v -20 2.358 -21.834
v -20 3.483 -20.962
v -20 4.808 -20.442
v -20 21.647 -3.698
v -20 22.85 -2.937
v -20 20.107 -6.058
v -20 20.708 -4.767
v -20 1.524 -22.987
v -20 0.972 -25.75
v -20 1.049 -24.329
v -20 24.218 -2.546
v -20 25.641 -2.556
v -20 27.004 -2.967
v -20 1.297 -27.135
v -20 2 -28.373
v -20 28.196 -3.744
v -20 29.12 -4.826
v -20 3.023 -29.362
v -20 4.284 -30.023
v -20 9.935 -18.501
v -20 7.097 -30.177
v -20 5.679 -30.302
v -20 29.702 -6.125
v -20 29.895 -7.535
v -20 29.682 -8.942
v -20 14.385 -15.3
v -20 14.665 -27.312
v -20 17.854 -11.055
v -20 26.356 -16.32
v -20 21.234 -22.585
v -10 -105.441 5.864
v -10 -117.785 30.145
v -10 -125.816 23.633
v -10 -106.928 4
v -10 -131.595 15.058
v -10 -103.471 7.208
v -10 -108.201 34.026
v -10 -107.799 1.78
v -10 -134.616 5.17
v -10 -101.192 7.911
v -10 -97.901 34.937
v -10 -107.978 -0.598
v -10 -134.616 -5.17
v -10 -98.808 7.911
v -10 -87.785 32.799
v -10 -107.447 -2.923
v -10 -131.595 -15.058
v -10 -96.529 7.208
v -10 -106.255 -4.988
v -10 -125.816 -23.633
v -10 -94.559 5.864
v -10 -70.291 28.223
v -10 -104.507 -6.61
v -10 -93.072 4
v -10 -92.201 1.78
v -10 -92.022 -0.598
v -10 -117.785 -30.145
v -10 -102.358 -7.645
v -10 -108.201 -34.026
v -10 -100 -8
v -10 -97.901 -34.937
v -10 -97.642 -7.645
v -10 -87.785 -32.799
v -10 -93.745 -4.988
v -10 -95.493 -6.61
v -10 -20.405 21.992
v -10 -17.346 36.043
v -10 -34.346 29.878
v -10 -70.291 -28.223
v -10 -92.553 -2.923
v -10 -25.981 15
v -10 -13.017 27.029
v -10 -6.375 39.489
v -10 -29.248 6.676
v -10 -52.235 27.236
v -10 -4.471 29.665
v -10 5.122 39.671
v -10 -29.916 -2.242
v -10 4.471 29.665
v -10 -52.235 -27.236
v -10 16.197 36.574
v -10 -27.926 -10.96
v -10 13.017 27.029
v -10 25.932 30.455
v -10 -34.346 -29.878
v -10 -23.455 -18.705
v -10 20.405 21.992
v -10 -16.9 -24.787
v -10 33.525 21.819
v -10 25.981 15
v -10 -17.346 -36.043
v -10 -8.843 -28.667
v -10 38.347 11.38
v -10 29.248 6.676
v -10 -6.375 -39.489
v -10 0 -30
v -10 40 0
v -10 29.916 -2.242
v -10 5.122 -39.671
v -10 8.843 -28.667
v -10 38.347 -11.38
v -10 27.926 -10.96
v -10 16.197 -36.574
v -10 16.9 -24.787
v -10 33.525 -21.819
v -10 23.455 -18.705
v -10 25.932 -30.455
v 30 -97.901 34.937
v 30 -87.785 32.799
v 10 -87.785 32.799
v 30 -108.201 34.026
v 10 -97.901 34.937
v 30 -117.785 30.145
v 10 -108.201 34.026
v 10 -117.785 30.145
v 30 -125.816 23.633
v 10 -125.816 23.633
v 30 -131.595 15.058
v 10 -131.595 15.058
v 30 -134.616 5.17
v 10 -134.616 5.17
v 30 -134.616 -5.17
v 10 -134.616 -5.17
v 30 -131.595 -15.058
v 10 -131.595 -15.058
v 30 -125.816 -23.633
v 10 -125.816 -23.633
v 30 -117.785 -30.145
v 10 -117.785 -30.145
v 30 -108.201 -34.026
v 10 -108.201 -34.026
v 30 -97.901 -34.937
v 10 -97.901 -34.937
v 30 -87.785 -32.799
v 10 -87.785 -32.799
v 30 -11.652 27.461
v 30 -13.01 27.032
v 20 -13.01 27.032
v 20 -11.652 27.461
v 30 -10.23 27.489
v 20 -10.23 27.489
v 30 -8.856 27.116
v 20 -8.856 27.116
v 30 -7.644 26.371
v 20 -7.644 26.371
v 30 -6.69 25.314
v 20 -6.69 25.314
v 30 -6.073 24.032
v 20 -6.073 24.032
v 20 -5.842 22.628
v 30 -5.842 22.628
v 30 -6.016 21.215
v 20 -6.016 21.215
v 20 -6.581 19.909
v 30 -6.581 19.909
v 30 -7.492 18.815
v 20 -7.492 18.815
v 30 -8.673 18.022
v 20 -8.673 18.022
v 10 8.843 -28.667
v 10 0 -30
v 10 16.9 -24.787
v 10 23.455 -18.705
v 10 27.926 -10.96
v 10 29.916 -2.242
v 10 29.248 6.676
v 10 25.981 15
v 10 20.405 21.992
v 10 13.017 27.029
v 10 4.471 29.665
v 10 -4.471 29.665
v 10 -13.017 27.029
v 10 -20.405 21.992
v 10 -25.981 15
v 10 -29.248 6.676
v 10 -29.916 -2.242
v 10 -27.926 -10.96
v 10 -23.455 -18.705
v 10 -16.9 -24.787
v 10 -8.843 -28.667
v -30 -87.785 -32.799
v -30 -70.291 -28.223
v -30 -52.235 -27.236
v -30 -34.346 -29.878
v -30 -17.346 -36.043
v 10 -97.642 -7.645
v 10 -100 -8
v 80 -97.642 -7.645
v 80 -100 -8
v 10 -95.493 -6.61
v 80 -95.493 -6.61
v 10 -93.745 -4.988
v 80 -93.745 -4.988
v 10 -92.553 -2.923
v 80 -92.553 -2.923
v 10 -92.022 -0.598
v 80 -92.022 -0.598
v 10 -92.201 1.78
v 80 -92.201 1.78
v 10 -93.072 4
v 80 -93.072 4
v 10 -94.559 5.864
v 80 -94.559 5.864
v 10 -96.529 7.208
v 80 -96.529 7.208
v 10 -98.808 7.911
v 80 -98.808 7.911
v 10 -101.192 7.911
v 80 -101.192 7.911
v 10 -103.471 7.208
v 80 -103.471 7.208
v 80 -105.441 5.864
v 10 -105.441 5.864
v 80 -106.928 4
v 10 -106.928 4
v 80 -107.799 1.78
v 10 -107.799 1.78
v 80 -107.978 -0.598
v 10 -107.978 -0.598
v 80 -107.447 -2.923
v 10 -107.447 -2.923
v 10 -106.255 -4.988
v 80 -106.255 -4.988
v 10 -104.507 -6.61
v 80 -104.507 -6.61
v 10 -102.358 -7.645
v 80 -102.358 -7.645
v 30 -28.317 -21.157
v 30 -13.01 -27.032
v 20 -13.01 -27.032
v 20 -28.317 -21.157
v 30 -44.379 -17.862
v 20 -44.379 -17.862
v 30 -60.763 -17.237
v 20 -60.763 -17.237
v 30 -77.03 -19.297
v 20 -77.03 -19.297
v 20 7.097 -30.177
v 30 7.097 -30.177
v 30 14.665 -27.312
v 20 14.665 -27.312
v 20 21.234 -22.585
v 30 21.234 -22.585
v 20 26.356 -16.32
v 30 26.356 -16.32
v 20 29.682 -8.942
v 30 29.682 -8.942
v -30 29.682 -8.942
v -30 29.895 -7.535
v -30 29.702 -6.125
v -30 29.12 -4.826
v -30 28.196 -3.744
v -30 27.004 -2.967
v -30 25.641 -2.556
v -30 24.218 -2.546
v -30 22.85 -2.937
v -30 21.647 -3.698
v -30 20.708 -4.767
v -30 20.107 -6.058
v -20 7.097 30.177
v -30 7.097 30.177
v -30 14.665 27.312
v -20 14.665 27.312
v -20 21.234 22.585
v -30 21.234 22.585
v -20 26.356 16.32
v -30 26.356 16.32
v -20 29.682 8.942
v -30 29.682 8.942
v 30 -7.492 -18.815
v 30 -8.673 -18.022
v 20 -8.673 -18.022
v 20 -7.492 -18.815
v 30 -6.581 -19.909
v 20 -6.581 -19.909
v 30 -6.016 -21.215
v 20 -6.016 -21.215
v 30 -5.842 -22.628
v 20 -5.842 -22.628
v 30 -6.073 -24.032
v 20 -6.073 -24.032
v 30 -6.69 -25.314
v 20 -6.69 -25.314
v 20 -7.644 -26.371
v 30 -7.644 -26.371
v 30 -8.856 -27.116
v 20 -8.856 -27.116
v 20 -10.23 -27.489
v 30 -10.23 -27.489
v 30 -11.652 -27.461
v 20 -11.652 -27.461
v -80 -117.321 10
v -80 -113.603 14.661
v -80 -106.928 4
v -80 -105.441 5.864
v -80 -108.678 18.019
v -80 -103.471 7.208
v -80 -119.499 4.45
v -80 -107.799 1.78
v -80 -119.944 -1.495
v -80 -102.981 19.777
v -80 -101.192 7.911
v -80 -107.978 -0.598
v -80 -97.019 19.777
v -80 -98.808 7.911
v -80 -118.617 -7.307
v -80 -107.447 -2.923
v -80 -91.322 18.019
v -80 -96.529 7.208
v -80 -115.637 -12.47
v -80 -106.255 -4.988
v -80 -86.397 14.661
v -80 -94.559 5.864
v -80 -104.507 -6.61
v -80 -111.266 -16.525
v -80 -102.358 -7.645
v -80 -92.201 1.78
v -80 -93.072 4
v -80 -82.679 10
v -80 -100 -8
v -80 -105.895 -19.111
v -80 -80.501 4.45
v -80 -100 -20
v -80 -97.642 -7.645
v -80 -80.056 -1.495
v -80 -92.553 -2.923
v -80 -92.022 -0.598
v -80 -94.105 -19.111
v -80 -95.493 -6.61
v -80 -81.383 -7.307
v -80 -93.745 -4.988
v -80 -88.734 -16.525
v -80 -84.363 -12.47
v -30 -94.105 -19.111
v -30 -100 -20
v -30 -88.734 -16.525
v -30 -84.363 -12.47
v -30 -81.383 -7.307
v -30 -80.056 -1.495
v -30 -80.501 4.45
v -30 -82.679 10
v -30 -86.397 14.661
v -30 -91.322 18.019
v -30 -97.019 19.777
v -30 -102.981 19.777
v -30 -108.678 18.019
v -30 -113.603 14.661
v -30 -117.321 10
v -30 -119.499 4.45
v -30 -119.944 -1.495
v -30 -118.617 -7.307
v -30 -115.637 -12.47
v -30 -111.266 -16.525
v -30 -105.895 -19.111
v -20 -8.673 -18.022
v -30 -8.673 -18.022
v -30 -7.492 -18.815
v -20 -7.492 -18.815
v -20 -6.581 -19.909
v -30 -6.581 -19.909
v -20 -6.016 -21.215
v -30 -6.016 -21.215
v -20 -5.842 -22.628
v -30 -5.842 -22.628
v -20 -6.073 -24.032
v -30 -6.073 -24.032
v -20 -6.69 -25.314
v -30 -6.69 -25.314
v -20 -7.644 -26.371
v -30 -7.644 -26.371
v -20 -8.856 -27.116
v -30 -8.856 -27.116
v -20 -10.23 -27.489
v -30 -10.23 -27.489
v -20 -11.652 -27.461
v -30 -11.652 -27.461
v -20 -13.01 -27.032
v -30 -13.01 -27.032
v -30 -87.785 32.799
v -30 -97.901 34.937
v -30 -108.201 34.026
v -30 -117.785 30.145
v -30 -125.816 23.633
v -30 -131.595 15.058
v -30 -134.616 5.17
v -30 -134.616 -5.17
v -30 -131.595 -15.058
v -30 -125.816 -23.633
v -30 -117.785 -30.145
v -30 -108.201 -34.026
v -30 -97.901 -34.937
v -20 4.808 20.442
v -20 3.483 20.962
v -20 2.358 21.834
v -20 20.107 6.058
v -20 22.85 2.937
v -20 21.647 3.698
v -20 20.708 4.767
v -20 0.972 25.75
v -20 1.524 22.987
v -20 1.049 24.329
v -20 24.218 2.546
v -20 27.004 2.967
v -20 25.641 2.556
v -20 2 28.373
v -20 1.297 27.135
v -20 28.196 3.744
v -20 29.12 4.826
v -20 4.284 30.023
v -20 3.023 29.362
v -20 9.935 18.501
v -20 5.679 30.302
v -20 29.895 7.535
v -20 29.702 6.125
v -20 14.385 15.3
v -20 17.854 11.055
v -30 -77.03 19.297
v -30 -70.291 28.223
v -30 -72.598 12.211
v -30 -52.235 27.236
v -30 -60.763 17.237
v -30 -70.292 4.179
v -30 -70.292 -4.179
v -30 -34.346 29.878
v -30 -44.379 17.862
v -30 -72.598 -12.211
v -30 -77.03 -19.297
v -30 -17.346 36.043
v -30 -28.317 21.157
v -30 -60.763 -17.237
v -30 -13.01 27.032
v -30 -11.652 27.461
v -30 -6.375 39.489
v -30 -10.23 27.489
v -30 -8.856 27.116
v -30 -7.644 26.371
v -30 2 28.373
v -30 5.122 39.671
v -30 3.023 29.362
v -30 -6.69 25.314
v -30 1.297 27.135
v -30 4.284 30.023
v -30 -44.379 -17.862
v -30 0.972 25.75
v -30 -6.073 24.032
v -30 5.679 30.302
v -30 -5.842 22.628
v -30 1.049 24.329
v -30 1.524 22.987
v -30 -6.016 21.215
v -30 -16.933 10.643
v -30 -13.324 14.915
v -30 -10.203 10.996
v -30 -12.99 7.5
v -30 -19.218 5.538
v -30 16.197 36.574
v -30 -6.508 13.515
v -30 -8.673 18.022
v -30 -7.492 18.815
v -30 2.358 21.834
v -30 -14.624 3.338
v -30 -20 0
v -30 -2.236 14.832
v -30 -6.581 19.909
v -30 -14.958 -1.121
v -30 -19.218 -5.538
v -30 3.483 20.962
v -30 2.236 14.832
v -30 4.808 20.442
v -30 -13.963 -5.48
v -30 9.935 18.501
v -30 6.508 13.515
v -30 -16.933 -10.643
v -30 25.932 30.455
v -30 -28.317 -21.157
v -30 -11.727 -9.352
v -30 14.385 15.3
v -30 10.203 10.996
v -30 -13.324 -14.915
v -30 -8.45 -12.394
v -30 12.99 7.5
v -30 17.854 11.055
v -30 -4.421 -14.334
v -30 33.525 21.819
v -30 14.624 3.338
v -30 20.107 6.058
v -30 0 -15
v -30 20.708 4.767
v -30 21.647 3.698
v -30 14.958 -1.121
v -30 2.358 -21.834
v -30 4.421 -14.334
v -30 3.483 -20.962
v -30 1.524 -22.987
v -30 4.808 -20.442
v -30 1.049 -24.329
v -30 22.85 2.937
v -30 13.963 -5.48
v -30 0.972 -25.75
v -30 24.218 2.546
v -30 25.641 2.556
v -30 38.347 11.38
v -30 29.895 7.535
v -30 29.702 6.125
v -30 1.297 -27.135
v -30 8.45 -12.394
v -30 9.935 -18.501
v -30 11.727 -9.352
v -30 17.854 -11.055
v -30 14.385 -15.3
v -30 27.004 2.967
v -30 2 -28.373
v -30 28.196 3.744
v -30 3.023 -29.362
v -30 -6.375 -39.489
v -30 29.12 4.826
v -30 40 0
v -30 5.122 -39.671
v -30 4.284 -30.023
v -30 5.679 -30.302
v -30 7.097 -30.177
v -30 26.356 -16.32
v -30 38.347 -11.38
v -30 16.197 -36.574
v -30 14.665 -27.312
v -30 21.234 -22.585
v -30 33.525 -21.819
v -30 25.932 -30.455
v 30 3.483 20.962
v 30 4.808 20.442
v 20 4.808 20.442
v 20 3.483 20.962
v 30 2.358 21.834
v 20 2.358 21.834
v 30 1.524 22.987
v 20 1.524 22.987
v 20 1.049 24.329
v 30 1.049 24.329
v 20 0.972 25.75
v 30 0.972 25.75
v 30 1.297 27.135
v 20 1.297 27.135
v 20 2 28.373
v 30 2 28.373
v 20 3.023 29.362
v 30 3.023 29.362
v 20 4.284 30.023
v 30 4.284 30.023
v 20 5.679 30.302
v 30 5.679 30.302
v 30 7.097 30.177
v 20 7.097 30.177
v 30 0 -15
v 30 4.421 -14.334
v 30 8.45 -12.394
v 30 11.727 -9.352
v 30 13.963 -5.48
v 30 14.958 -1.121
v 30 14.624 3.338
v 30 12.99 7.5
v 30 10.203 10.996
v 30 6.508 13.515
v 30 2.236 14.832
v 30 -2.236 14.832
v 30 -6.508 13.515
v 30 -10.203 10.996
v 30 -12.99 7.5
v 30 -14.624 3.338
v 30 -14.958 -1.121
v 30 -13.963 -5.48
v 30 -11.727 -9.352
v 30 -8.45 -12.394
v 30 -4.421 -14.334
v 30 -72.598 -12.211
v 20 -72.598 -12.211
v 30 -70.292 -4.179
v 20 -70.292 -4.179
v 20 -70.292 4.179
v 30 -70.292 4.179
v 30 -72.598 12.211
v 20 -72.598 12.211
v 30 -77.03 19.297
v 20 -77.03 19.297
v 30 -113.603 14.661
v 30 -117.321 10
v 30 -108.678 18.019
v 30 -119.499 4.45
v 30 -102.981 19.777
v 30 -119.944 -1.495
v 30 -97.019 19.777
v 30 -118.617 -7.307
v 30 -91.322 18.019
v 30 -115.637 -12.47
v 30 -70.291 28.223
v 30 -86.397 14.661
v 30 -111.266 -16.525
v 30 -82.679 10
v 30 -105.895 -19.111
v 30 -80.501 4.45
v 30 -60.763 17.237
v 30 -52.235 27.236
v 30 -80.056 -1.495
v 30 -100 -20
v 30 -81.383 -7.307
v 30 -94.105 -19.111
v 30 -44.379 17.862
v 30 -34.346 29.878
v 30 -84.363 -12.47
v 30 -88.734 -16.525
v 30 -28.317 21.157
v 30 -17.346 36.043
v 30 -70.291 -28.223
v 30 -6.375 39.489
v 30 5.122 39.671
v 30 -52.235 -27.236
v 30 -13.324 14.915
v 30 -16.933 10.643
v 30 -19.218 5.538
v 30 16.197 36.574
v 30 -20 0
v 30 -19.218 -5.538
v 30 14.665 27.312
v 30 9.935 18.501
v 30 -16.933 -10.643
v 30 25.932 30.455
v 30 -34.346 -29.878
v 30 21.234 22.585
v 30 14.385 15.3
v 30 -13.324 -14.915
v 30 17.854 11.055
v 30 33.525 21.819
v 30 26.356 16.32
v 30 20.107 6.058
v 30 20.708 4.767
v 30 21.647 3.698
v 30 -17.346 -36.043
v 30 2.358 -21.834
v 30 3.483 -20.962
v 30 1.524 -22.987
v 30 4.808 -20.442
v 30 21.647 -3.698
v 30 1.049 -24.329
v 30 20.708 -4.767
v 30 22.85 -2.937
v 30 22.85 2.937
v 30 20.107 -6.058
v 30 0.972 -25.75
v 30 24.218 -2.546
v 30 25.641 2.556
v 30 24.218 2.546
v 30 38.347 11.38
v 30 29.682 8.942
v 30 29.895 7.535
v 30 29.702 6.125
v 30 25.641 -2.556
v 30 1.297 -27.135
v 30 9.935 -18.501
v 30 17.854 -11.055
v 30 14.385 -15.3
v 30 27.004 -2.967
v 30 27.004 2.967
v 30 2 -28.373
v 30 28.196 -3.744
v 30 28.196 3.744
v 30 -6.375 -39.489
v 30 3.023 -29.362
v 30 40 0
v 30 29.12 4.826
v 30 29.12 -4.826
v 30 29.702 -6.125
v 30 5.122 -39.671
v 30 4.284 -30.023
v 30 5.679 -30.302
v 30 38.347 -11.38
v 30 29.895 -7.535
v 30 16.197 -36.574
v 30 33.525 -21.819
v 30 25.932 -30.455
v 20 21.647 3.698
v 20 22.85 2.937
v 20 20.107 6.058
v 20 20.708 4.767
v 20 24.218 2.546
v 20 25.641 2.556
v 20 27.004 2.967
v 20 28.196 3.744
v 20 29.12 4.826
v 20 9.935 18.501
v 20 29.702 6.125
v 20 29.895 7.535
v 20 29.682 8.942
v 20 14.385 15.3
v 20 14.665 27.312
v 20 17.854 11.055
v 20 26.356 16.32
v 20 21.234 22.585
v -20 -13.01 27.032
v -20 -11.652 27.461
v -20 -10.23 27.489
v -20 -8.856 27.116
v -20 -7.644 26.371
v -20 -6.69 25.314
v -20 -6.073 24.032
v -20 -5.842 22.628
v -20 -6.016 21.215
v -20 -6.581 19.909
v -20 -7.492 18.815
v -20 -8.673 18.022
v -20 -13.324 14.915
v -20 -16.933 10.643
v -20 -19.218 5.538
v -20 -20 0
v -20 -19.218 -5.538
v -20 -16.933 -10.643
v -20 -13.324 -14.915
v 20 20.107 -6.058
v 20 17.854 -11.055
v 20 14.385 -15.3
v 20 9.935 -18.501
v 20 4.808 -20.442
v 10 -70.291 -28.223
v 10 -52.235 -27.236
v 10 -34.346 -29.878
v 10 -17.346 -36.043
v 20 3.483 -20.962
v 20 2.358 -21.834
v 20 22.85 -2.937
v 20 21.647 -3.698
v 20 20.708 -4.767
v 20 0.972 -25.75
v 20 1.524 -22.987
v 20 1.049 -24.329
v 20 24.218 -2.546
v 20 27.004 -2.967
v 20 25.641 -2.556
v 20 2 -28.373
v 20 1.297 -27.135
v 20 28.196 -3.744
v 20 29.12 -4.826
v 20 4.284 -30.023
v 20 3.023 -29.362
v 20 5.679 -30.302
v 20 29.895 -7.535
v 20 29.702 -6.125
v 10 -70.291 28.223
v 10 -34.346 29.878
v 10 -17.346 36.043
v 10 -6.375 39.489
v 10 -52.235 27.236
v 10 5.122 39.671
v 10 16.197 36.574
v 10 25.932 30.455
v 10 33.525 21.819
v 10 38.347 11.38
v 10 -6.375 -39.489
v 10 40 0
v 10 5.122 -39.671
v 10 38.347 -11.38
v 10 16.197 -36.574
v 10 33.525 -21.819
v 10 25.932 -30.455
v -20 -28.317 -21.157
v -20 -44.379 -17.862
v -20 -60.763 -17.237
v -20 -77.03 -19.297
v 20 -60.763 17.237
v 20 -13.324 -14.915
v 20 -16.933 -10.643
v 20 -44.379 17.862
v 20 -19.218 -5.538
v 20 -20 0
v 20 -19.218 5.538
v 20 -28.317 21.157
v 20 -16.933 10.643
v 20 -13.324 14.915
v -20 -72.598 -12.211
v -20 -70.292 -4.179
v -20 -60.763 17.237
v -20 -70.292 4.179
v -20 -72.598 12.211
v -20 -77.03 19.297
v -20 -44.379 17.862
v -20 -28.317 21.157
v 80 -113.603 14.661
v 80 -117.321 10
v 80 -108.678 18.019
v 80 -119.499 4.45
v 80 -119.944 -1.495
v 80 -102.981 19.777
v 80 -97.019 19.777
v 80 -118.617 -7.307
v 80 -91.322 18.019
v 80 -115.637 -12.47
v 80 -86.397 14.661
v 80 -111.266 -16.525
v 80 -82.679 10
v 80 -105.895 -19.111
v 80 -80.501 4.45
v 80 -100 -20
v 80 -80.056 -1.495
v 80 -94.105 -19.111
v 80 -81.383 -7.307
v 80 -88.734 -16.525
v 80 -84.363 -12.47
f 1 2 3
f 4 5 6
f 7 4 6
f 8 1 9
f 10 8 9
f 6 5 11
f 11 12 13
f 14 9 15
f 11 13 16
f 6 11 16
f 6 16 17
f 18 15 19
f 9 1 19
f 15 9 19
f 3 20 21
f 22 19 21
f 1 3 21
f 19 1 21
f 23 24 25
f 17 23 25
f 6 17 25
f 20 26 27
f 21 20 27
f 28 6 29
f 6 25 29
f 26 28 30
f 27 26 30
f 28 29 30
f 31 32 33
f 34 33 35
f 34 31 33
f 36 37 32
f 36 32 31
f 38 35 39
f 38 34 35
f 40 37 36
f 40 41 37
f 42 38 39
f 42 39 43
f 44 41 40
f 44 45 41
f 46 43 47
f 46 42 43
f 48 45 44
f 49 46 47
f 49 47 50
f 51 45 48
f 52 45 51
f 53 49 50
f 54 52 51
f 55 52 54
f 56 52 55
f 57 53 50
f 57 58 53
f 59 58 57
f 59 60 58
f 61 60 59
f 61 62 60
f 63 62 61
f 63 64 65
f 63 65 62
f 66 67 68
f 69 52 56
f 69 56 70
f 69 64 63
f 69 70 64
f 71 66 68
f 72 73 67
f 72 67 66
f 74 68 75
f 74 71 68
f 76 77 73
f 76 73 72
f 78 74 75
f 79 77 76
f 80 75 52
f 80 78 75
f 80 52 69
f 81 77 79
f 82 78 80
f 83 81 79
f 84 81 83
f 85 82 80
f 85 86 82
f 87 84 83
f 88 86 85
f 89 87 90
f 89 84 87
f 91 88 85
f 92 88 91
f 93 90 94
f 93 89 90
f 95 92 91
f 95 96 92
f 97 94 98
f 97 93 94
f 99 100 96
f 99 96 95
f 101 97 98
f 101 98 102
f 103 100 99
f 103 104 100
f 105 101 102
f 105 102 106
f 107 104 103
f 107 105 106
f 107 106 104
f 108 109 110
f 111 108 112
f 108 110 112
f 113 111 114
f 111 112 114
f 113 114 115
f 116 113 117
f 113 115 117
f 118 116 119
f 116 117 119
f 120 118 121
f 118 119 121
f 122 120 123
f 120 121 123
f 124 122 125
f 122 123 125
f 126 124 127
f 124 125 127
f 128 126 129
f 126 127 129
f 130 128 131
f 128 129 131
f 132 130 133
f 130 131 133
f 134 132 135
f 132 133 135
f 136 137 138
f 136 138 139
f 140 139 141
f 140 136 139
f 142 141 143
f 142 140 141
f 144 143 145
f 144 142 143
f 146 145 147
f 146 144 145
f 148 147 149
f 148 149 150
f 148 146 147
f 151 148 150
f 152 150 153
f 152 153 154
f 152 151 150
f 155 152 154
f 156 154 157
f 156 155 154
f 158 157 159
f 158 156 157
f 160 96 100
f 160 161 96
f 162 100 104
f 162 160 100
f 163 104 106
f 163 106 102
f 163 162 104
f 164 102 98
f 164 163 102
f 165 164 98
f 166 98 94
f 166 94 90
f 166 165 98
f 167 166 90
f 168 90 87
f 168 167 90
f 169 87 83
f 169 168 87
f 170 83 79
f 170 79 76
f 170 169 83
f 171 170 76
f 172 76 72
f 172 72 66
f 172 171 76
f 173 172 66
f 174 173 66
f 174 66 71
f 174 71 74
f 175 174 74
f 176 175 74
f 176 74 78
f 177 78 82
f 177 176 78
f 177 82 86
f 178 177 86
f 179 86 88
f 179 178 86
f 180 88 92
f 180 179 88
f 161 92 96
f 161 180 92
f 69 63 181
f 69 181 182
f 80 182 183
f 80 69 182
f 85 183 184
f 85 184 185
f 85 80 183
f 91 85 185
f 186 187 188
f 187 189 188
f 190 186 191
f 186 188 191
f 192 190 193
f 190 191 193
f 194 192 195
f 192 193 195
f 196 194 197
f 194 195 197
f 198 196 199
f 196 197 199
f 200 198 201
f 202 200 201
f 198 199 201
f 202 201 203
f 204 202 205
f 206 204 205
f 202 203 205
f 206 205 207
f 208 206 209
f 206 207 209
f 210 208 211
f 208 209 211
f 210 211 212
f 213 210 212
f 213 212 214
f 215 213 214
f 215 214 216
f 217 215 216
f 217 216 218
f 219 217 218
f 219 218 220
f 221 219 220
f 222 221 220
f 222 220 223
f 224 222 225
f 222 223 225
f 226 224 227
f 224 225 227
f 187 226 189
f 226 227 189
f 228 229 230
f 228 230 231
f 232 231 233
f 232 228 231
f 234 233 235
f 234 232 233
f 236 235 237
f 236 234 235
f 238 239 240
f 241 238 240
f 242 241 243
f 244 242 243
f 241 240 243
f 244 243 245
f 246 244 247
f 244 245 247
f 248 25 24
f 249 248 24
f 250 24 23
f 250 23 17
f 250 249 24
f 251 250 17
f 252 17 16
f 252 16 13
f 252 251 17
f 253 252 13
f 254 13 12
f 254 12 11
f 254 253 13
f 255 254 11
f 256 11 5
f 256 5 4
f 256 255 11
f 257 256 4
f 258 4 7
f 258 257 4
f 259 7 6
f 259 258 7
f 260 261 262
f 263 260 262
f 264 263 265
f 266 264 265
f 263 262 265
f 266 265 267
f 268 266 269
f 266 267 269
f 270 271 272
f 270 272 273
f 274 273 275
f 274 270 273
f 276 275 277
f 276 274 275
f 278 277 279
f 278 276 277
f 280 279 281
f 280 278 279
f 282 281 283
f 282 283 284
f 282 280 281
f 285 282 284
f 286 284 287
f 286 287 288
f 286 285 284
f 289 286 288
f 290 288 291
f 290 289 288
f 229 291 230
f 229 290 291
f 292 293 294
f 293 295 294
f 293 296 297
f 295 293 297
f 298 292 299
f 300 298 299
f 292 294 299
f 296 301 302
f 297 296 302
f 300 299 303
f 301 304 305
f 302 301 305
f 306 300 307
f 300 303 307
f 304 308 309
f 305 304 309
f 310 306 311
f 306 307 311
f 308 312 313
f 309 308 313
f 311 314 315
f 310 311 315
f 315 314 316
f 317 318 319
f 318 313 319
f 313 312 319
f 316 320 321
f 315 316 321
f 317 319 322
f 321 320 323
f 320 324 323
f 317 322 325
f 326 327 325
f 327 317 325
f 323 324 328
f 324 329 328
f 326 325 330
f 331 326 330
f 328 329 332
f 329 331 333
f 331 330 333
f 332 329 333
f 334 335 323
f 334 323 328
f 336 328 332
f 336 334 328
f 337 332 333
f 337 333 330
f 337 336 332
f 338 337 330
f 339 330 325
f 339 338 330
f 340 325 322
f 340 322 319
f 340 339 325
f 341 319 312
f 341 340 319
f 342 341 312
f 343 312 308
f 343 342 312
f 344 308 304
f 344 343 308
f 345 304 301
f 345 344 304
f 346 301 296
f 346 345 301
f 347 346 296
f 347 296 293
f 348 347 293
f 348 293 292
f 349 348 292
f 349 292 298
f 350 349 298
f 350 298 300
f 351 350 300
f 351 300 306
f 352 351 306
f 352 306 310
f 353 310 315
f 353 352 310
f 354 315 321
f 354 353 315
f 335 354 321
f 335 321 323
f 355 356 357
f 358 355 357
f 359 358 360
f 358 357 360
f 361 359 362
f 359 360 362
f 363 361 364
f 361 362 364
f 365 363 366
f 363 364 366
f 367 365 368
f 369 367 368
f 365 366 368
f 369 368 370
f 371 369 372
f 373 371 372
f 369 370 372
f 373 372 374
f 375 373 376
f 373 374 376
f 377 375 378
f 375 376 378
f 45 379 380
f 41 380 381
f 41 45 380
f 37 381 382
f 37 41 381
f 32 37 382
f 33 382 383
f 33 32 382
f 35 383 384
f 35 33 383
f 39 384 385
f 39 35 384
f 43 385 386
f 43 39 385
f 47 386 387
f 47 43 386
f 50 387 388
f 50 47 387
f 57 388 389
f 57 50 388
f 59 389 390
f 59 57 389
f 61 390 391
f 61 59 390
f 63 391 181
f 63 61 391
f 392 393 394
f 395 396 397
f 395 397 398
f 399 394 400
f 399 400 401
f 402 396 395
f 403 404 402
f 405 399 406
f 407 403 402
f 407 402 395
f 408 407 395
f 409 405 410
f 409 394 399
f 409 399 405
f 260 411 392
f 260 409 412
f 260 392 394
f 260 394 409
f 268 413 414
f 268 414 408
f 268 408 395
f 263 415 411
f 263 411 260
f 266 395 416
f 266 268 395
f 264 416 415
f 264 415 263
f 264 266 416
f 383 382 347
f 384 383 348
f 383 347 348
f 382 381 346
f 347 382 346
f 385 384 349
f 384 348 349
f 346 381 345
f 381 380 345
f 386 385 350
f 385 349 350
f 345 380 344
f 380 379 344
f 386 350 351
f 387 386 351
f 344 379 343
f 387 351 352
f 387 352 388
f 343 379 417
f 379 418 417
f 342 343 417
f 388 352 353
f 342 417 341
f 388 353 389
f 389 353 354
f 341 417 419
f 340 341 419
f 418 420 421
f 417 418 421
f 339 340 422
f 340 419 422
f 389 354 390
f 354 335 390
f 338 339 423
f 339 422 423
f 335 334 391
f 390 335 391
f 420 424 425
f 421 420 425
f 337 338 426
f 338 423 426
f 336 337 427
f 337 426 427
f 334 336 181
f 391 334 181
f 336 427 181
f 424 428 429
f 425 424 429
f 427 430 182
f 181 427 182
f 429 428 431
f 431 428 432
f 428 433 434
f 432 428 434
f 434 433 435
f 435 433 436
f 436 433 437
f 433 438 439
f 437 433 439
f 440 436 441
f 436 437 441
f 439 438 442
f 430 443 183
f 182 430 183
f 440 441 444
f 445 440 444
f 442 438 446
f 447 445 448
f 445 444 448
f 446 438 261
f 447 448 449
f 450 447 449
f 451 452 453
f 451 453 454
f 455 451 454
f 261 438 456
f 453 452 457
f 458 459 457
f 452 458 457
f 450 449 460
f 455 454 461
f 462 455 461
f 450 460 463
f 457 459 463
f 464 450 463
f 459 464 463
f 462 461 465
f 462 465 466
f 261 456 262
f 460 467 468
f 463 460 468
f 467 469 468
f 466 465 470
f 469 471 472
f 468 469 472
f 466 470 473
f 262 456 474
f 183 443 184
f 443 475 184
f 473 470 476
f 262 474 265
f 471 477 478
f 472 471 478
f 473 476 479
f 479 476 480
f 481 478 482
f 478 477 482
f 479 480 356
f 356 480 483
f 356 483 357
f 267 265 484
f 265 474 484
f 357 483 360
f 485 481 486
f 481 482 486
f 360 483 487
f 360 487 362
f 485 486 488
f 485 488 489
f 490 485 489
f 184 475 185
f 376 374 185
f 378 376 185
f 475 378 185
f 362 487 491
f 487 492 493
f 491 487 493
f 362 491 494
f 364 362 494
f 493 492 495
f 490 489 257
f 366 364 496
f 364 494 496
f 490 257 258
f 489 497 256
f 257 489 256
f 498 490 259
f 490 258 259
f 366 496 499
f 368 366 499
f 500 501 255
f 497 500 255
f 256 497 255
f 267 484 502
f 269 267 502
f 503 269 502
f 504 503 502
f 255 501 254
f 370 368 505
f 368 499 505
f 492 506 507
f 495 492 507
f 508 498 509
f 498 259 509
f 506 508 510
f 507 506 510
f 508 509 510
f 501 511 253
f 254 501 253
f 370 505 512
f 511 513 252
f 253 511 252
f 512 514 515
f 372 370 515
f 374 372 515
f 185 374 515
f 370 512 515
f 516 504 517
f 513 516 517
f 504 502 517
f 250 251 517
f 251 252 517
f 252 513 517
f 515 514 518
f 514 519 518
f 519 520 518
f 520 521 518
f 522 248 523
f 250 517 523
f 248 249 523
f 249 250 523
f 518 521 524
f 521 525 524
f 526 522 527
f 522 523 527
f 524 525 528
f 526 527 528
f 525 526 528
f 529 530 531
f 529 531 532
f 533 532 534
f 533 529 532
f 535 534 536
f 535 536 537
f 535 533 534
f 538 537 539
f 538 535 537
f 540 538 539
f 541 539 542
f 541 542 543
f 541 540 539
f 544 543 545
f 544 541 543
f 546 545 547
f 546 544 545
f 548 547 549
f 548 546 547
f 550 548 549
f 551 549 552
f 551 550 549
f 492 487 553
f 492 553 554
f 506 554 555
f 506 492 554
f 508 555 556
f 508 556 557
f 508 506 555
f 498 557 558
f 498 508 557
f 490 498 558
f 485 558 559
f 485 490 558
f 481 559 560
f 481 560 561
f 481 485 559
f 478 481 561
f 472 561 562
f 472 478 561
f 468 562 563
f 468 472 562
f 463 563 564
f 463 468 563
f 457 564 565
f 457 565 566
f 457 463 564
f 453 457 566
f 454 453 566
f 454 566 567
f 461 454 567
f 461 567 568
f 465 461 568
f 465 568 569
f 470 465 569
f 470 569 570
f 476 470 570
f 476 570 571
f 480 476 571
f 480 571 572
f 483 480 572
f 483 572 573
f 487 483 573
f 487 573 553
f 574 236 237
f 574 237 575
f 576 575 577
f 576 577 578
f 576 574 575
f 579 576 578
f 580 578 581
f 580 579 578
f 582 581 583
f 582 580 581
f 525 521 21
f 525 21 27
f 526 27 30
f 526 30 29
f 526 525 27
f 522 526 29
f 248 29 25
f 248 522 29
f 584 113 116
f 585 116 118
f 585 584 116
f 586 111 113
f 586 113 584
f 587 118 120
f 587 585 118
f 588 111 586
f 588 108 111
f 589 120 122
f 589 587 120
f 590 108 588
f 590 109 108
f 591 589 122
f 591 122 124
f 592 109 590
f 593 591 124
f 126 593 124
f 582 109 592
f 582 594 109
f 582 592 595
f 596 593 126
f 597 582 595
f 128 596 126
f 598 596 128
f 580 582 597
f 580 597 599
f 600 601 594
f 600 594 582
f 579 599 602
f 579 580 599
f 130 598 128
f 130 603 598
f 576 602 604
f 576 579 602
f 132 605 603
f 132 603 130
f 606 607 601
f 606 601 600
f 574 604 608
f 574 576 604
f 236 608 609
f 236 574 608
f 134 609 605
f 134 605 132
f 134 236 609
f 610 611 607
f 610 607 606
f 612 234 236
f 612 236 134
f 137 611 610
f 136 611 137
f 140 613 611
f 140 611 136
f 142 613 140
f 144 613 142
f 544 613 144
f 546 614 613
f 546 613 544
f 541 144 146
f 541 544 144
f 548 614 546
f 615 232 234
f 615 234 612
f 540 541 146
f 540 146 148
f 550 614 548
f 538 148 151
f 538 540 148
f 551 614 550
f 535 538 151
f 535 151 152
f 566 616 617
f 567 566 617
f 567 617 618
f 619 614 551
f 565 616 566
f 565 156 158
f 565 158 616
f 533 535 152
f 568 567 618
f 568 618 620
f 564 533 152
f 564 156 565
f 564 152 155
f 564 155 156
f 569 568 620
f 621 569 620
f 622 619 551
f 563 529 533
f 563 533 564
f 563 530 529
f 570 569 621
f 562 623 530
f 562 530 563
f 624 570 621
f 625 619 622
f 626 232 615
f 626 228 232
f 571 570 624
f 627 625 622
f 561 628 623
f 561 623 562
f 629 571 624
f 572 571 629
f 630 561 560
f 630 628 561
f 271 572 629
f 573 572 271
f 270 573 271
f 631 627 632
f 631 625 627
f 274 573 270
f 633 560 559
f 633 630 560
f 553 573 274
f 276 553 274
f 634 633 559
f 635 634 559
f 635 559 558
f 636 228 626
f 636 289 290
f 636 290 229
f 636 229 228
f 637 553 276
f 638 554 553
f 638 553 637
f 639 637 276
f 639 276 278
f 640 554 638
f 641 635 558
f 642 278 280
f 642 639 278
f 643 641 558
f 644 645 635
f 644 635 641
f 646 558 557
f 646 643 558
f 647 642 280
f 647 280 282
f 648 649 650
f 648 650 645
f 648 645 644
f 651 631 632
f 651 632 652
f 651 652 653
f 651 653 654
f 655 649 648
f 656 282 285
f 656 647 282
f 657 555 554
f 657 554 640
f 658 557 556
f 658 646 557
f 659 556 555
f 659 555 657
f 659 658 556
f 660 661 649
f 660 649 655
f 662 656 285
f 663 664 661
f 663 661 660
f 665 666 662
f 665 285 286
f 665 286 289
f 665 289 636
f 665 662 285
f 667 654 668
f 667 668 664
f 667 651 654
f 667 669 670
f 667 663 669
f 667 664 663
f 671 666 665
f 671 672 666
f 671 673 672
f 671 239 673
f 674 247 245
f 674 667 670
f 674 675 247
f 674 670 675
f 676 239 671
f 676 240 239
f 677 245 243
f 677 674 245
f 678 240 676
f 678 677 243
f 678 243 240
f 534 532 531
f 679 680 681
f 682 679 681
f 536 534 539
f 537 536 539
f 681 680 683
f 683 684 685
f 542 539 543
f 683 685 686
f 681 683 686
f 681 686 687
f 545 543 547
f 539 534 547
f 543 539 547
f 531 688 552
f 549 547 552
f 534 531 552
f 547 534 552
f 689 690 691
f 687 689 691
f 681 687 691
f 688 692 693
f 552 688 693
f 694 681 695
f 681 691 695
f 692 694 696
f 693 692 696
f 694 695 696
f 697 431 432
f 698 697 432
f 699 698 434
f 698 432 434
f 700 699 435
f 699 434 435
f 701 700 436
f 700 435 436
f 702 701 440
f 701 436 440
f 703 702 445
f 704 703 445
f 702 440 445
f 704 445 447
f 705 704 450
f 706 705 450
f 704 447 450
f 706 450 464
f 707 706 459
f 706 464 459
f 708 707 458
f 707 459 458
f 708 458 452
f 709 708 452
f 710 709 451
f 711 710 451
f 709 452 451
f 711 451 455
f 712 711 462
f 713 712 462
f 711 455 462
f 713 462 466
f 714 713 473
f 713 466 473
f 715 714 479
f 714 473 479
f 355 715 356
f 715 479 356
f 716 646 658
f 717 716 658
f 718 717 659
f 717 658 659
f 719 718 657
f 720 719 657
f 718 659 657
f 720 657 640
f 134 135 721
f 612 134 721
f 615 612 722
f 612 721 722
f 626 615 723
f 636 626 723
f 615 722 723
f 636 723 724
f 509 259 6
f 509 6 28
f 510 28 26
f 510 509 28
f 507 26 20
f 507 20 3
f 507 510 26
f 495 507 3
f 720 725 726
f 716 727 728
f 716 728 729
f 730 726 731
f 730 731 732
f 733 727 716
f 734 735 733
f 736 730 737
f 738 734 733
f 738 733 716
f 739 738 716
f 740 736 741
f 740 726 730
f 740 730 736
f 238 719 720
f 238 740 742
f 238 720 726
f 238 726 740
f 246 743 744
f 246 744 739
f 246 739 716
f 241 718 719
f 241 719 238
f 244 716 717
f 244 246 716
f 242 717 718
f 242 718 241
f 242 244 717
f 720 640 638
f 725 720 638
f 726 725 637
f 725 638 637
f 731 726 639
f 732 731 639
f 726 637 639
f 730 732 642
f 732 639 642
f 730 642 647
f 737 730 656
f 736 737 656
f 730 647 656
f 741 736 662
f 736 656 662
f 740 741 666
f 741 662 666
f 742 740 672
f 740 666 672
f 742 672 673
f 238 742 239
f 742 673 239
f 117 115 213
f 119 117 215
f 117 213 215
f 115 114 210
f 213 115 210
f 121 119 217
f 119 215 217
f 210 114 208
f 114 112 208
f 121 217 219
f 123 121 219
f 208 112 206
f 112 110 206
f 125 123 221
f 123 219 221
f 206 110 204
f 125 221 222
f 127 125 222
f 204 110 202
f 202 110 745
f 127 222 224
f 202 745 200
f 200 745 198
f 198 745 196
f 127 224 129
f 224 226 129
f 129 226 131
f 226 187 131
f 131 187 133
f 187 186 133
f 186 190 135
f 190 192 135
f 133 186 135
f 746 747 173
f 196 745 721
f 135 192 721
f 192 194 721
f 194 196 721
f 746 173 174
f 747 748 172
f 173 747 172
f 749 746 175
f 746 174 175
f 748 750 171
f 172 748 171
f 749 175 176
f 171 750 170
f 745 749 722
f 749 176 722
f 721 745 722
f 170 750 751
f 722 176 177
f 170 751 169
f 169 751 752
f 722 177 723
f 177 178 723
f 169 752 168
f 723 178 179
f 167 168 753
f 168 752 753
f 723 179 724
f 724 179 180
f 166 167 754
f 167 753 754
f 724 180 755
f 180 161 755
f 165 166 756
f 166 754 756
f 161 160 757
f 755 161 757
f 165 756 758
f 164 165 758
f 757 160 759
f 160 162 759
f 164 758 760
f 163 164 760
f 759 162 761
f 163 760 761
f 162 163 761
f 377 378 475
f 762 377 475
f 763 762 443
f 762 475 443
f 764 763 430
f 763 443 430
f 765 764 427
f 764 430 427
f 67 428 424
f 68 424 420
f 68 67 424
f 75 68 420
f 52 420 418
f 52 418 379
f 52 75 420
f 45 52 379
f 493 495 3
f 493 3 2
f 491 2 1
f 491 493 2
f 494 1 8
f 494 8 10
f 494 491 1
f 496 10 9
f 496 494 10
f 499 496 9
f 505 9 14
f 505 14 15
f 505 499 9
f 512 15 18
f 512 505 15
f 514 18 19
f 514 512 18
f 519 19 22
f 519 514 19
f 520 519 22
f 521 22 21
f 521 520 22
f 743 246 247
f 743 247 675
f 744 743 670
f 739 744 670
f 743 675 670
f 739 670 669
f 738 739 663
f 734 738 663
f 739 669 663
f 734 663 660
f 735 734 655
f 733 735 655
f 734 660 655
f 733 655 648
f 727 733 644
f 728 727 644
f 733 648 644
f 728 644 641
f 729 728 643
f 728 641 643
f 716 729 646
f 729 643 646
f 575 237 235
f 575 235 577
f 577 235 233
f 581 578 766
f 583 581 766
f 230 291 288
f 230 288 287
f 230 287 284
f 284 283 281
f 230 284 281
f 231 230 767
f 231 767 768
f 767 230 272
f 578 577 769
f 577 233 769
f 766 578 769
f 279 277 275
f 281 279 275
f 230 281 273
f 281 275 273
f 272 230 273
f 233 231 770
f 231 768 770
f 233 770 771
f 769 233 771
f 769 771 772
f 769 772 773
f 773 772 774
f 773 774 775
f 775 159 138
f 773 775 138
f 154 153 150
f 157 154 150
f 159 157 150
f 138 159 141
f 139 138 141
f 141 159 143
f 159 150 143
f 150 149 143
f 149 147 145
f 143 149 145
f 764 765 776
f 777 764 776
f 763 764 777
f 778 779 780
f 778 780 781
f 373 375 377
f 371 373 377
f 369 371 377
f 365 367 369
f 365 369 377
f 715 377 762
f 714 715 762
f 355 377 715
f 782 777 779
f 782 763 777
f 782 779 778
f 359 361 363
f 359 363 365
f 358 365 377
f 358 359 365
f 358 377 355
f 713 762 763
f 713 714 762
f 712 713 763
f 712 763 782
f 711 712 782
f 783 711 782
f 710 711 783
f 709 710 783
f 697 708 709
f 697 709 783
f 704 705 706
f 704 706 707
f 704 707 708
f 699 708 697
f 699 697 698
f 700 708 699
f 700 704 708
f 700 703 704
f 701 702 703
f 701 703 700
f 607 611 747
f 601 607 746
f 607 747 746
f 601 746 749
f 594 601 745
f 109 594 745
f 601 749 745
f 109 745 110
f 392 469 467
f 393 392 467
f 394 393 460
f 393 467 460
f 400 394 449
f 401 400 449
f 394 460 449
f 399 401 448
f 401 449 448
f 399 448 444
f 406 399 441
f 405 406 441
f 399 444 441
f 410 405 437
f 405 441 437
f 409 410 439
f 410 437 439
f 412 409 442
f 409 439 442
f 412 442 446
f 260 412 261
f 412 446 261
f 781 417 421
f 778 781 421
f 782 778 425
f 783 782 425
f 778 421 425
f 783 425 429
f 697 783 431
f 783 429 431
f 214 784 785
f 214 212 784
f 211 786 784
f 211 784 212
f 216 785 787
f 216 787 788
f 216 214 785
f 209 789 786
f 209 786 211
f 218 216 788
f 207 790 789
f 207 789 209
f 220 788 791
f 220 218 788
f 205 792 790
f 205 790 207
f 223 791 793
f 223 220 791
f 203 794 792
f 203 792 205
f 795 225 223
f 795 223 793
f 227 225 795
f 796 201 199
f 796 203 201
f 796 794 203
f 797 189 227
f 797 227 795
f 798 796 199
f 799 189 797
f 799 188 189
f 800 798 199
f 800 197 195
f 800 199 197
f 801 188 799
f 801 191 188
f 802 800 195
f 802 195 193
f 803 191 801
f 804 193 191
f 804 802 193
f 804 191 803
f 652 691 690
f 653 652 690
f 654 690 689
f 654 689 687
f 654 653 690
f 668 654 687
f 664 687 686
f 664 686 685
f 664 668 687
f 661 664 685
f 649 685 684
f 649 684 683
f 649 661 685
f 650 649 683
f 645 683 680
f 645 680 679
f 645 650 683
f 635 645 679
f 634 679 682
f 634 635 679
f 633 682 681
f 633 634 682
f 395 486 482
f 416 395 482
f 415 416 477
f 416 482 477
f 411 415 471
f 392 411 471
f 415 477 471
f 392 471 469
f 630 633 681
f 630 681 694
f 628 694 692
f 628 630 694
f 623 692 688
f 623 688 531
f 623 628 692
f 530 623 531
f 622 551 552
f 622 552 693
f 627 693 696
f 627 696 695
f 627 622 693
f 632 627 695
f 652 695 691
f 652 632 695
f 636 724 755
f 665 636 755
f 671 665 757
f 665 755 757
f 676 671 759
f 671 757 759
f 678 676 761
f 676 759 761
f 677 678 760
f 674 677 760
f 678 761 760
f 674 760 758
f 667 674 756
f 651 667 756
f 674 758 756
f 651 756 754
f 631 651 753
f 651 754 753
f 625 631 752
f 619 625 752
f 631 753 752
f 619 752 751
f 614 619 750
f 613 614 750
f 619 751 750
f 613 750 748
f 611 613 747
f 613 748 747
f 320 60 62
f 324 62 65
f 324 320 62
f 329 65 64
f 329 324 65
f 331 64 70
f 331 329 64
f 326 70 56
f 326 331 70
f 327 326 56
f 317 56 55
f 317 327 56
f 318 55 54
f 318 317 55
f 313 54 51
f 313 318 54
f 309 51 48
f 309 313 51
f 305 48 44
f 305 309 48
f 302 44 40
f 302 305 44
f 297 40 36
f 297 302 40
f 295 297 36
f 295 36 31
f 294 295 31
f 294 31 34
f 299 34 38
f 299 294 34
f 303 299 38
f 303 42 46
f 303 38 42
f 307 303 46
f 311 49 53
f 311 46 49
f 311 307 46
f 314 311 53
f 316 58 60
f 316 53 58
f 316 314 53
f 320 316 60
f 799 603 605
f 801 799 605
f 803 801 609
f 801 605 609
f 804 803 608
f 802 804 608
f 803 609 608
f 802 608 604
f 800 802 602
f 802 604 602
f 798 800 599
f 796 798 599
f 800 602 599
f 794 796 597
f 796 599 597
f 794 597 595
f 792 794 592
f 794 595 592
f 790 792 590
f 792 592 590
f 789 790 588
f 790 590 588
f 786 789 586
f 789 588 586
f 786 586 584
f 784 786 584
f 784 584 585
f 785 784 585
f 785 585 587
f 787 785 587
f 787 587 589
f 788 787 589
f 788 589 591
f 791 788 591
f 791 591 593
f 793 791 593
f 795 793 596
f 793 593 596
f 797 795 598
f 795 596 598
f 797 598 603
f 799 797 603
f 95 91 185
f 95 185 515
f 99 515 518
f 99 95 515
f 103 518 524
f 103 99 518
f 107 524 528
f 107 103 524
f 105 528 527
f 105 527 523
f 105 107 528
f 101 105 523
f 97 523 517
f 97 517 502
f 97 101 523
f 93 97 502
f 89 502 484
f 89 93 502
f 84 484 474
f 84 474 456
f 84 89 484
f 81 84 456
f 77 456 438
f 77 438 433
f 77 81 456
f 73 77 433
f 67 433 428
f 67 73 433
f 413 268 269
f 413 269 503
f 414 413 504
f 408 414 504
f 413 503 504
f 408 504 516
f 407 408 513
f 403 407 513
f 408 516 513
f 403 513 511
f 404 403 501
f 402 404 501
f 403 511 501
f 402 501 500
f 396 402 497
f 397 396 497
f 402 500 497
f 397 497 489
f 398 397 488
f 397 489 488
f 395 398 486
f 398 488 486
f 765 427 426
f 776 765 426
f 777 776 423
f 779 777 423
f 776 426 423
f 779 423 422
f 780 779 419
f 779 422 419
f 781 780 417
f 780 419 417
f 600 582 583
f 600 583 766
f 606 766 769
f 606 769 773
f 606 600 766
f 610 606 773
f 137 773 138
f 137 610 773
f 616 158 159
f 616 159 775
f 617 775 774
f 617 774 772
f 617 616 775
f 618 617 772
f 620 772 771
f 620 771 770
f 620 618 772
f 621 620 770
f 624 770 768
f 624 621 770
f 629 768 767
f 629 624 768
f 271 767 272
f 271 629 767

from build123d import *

# Parameters (mm, degrees)
SKETCH1_R           = 30
BOSS_EXTRUDE1_DEPTH = 10
BOSS_EXTRUDE2_DEPTH = 20
SKETCH3_R           = 20
BOSS_EXTRUDE3_DEPTH = 50
CUT_EXTRUDE1_DEPTH  = 10
SKETCH5_R           = 15
CUT_EXTRUDE2_DEPTH  = 41
SKETCH6_R           = 8
CUT_EXTRUDE3_DEPTH  = 91


with BuildPart() as part:
    # Sketch1 → Boss-Extrude1 (new body, symmetric)
    with BuildSketch(Plane(origin=(0, 0, 0), x_dir=(0, 0, -1), z_dir=(1, 0, 0))):
        Circle(SKETCH1_R)
    extrude(amount=BOSS_EXTRUDE1_DEPTH, both=True)

    # Sketch2 → Boss-Extrude2 (add)
    with BuildSketch(Plane(origin=(10, 0, 0), x_dir=(0, 0, -1), z_dir=(1, 0, 0))):
        with BuildLine():
            ThreePointArc((36.043181696, -17.346153846), (0, 40), (-36.043181696, -17.346153846))
            ThreePointArc((-36.043181696, -17.346153846), (-27.235626529, -52.234661385), (-32.799295343, -87.785))
            ThreePointArc((-32.799295343, -87.785), (0, -135), (32.799295343, -87.785))
            ThreePointArc((32.799295343, -87.785), (27.235626529, -52.234661385), (36.043181696, -17.346153846))
        make_face()
    boss_extrude2 = extrude(amount=BOSS_EXTRUDE2_DEPTH)

    # Sketch3 → Boss-Extrude3 (add)
    with BuildSketch(Plane(origin=(30, 0, 0), x_dir=(0, 0, -1), z_dir=(1, 0, 0))):
        with Locations((0, -100)):
            Circle(SKETCH3_R)
    boss_extrude3 = extrude(amount=BOSS_EXTRUDE3_DEPTH)

    # Sketch4 → Cut-Extrude1 (cut)
    with BuildSketch(Plane(origin=(30, 0, 0), x_dir=(0, 0, -1), z_dir=(1, 0, 0))):
        with BuildLine():
            ThreePointArc((30.176724251, 7.096852363), (22.585383623, 21.234416559), (8.942307692, 29.682235986))
            ThreePointArc((8.942307692, 29.682235986), (2.712542583, 26.337086261), (6.057692308, 20.107321152))
            ThreePointArc((6.057692308, 20.107321152), (15.299776003, 14.384604766), (20.442297073, 4.807545149))
            ThreePointArc((20.442297073, 4.807545149), (26.454164269, 1.084985167), (30.176724251, 7.096852363))
        make_face()
        with BuildLine():
            ThreePointArc((-30.176724251, 7.096852363), (-22.585383623, 21.234416559), (-8.942307692, 29.682235986))
            ThreePointArc((-8.942307692, 29.682235986), (-2.712542583, 26.337086261), (-6.057692308, 20.107321152))
            ThreePointArc((-6.057692308, 20.107321152), (-15.299776003, 14.384604766), (-20.442297073, 4.807545149))
            ThreePointArc((-20.442297073, 4.807545149), (-26.454164269, 1.084985167), (-30.176724251, 7.096852363))
        make_face()
        with BuildLine():
            ThreePointArc((27.032386272, -13.009615385), (17.862474513, -44.37894553), (19.296651575, -77.029600831))
            ThreePointArc((19.296651575, -77.029600831), (0, -70), (-19.296651575, -77.029600831))
            ThreePointArc((-19.296651575, -77.029600831), (-17.862474513, -44.37894553), (-27.032386272, -13.009615385))
            ThreePointArc((-27.032386272, -13.009615385), (-24.695257791, -6.335948442), (-18.021590848, -8.673076923))
            ThreePointArc((-18.021590848, -8.673076923), (0, -20), (18.021590848, -8.673076923))
            ThreePointArc((18.021590848, -8.673076923), (24.695257791, -6.335948442), (27.032386272, -13.009615385))
        make_face()
    cut_extrude1 = extrude(amount=-CUT_EXTRUDE1_DEPTH, mode=Mode.SUBTRACT)

    # Sketch5 → Cut-Extrude2 (cut, through all)
    with BuildSketch(Plane(origin=(30, 0, 0), x_dir=(0, 0, -1), z_dir=(1, 0, 0))):
        Circle(SKETCH5_R)
    cut_extrude2 = extrude(amount=-CUT_EXTRUDE2_DEPTH, mode=Mode.SUBTRACT)

    # Sketch6 → Cut-Extrude3 (cut, through all)
    with BuildSketch(Plane(origin=(80, 0, 0), x_dir=(0, 0, -1), z_dir=(1, 0, 0))):
        with Locations((0, -100)):
            Circle(SKETCH6_R)
    cut_extrude3 = extrude(amount=-CUT_EXTRUDE3_DEPTH, mode=Mode.SUBTRACT)

    # Mirror1: Boss-Extrude2, Boss-Extrude3, Cut-Extrude1, Cut-Extrude2, Cut-Extrude3 across plane
    add(boss_extrude2.mirror(Plane(origin=(0, 0, 0), x_dir=(0, 0, 1), z_dir=(1, 0, 0))))
    add(boss_extrude3.mirror(Plane(origin=(0, 0, 0), x_dir=(0, 0, 1), z_dir=(1, 0, 0))))
    add(cut_extrude1.mirror(Plane(origin=(0, 0, 0), x_dir=(0, 0, 1), z_dir=(1, 0, 0))), mode=Mode.SUBTRACT)
    add(cut_extrude2.mirror(Plane(origin=(0, 0, 0), x_dir=(0, 0, 1), z_dir=(1, 0, 0))), mode=Mode.SUBTRACT)
    add(cut_extrude3.mirror(Plane(origin=(0, 0, 0), x_dir=(0, 0, 1), z_dir=(1, 0, 0))), mode=Mode.SUBTRACT)


solid = part.part
